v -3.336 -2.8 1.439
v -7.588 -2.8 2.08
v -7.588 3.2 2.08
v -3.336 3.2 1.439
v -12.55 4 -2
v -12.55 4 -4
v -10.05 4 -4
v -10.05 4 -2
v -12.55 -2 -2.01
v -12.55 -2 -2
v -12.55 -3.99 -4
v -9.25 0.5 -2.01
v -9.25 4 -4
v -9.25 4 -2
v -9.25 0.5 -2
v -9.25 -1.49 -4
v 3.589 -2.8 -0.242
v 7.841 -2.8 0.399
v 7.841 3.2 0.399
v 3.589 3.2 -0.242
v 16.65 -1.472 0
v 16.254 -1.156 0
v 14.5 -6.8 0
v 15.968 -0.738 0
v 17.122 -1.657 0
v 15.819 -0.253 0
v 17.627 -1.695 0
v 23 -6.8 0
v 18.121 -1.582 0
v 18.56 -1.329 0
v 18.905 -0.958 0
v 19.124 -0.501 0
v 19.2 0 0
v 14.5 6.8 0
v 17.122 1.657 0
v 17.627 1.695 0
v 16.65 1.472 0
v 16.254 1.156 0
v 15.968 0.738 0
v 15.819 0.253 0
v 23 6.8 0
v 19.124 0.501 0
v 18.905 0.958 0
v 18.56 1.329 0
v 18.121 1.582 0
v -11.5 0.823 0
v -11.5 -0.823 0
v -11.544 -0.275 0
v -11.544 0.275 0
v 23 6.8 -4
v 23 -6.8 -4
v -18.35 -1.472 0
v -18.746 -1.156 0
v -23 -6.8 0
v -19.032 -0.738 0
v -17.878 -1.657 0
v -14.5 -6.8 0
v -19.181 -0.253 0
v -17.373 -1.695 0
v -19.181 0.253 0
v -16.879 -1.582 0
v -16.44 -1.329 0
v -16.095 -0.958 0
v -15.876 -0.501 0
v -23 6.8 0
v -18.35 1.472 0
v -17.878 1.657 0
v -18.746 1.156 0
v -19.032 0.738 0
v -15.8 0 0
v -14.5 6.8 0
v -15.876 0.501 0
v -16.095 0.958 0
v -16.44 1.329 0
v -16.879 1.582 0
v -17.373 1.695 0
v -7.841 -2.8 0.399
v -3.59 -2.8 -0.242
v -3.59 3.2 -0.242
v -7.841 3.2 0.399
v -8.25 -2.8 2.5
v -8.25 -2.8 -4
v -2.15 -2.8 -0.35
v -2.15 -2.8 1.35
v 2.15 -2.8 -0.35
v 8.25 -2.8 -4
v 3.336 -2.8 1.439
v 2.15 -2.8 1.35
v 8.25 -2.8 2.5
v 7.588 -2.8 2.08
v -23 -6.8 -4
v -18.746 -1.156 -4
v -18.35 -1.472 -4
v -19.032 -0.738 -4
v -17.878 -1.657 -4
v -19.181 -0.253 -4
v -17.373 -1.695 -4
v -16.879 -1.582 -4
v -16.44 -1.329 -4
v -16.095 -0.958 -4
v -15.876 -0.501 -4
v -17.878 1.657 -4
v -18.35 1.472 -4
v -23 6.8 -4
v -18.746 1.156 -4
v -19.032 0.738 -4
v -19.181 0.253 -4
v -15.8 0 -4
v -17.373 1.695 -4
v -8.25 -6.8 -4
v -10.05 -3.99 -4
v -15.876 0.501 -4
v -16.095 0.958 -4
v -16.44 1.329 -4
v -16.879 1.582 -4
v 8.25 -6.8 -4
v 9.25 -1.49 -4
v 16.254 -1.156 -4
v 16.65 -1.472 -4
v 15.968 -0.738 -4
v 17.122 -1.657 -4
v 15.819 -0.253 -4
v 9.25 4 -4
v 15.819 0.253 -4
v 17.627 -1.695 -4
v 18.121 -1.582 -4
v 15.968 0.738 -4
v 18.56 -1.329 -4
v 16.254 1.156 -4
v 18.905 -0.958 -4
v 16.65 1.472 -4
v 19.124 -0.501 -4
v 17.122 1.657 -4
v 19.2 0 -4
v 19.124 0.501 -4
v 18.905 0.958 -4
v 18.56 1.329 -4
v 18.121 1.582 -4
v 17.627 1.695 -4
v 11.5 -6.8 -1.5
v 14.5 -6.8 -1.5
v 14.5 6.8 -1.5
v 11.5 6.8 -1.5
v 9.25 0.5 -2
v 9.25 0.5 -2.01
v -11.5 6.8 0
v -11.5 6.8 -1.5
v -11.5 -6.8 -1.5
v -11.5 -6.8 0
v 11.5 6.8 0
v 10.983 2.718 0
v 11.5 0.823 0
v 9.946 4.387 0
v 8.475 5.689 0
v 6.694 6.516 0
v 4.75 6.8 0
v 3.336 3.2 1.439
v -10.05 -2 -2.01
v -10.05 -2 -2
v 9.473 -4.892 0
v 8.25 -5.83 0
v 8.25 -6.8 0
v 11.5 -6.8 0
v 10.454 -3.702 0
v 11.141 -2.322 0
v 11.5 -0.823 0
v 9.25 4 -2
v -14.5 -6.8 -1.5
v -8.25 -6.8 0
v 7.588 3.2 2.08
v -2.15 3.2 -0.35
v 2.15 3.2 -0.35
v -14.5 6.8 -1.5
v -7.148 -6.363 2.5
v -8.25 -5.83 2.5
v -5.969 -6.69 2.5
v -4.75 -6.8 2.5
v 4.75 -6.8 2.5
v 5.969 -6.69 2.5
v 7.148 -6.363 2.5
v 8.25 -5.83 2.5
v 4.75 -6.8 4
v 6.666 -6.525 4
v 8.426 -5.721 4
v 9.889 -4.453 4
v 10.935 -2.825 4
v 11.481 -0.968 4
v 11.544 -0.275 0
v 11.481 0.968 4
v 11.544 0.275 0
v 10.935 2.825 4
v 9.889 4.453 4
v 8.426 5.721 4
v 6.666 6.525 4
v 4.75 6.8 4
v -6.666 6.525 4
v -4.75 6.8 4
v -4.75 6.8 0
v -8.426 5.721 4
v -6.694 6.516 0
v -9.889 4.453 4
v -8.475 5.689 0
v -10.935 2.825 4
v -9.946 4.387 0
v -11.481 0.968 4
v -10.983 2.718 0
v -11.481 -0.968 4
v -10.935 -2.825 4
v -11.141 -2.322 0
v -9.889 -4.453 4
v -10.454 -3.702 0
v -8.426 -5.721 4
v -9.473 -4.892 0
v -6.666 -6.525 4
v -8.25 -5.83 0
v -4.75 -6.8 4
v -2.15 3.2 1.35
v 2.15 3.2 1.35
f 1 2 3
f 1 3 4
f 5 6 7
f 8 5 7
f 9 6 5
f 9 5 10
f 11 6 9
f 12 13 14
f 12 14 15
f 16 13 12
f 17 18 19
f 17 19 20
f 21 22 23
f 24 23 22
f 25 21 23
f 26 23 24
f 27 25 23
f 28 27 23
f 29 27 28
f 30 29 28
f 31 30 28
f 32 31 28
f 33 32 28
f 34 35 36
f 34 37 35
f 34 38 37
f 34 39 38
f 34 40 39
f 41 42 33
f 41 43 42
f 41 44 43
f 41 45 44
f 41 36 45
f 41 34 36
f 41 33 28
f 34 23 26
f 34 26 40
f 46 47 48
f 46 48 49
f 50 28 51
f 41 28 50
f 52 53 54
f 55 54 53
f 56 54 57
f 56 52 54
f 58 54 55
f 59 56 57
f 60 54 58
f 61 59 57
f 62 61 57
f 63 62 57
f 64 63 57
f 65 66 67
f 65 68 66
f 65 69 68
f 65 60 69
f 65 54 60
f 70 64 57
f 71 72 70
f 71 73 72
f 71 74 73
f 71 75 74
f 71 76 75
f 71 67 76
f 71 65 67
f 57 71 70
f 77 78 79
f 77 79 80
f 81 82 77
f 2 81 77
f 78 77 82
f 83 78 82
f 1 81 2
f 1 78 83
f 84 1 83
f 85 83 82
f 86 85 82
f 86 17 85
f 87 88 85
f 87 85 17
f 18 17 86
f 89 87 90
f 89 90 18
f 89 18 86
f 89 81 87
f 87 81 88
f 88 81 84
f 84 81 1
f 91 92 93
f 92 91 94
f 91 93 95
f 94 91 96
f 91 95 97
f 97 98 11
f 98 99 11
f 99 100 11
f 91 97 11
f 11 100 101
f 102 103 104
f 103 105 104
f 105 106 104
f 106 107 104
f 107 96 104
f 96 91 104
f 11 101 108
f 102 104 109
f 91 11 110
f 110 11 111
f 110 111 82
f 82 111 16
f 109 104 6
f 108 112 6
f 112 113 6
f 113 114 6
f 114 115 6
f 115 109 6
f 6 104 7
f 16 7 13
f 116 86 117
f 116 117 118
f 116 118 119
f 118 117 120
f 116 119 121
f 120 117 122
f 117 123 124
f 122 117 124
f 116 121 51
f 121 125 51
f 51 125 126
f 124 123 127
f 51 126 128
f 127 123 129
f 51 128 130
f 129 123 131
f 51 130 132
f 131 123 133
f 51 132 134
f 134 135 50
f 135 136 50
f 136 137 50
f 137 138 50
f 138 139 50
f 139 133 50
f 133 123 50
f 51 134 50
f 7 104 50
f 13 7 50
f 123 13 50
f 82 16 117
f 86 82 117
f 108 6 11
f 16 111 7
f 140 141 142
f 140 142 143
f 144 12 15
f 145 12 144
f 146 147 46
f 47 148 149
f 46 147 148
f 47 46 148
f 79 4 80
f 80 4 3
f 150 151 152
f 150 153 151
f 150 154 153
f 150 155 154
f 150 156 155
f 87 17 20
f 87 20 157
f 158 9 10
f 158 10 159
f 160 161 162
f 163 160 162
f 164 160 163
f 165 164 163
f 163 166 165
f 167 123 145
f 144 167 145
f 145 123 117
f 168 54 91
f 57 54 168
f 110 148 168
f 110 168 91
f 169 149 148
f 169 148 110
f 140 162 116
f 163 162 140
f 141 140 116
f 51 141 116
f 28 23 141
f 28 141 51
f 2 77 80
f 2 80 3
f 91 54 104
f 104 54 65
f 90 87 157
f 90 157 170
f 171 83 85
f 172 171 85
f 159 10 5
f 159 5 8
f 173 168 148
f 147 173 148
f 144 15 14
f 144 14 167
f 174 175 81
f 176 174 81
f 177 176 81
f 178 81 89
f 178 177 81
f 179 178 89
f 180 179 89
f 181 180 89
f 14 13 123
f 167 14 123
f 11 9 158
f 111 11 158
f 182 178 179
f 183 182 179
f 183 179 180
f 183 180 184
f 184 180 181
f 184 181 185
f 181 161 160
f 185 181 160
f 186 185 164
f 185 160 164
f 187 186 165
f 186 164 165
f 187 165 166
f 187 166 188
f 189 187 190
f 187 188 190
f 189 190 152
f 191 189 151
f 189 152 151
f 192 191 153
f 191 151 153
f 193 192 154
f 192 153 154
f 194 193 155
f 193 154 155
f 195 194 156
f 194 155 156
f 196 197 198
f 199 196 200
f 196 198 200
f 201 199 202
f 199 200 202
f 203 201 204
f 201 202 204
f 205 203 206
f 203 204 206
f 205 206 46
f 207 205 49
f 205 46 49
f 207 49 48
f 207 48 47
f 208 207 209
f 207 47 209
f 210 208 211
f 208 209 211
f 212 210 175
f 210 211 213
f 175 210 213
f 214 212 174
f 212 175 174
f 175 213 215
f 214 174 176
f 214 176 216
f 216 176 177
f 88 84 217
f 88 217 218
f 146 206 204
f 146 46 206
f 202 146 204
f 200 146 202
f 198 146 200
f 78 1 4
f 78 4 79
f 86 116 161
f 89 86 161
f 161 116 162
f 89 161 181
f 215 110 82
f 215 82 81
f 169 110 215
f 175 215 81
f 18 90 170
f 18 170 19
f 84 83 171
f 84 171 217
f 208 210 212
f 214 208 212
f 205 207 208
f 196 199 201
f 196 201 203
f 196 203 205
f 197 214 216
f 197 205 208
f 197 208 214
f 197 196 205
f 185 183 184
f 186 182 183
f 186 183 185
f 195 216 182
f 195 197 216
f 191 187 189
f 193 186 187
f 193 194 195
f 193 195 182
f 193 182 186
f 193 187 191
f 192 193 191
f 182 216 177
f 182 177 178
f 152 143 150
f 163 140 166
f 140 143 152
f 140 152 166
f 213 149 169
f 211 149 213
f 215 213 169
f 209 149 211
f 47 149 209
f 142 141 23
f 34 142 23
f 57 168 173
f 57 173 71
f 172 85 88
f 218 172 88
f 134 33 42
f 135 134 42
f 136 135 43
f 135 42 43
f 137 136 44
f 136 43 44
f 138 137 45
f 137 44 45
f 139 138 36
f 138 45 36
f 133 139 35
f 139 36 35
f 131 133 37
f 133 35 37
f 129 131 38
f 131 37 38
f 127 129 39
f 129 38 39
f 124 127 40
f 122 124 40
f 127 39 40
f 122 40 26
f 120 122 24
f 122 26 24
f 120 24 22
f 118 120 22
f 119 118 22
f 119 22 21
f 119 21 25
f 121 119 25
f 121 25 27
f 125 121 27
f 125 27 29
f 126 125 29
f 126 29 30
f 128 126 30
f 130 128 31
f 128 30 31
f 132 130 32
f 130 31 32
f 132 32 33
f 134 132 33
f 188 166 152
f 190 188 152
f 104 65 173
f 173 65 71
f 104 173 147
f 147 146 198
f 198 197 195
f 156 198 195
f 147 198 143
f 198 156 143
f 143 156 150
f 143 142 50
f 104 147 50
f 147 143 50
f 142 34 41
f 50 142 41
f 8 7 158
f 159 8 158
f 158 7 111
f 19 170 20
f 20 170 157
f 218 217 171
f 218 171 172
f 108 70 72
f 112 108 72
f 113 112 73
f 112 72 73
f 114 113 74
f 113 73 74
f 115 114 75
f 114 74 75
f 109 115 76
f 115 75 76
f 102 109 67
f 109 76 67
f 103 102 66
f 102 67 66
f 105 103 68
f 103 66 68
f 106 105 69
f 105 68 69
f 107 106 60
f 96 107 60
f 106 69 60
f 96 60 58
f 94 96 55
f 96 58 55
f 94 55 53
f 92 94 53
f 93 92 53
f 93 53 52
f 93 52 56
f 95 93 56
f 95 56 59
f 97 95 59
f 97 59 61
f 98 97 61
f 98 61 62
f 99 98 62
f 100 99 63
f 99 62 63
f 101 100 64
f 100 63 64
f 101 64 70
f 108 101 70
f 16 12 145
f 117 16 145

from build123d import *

# Parameters (mm, degrees)
SKETCH_W        = 46
SKETCH_H        = 13.6
SKETCH_R        = 1.7
PAD_DEPTH       = 4
PAD001_DEPTH    = 4
SKETCH002_W     = 4.3
SKETCH002_H     = 1.7
POCKET_DEPTH    = 10
SKETCH003_W     = 16.5
SKETCH003_H     = 7.2
POCKET001_DEPTH = 4
SKETCH004_W     = 3
SKETCH004_H     = 1.5
POCKET002_DEPTH = 110.862709
SKETCH005_W     = 18.5
SKETCH005_H     = 3.5
SKETCH005_W_2   = 2.5
SKETCH005_H_2   = 6
POCKET003_DEPTH = 2
CHAMFER_SIZE    = 1.99
CHAMFER001_SIZE = 1.99


with BuildPart() as part:
    # Sketch → Pad (new body)
    with BuildSketch(Plane.XY):
        Rectangle(SKETCH_W, SKETCH_H)
        with Locations((-17.5, 0)):
            Circle(SKETCH_R, mode=Mode.SUBTRACT)
        with Locations((17.5, 0)):
            Circle(SKETCH_R, mode=Mode.SUBTRACT)
    extrude(amount=-PAD_DEPTH)

    # Sketch001 → Pad001 (new body)
    with BuildSketch(Plane.XY):
        with BuildLine():
            ThreePointArc((-4.75, 6.8), (-11.55, 0), (-4.75, -6.8))
            Line((-4.75, -6.8), (4.75, -6.8))
            ThreePointArc((4.75, -6.8), (11.55, 0), (4.75, 6.8))
            Line((-4.75, 6.8), (4.75, 6.8))
        make_face()
    extrude(amount=PAD001_DEPTH)

    # Sketch002 → Pocket (cut)
    with BuildSketch(Plane.XZ.offset(6.8)):
        Polygon((-7.588114, 2.079739), (-3.336138, 1.438879), (-3.589501, -0.242134), (-7.841477, 0.398725), align=None)
        with Locations((0, 0.5)):
            Rectangle(SKETCH002_W, SKETCH002_H)
        Polygon((3.336139, 1.438884), (7.588117, 2.079734), (7.841476, 0.39872), (3.589499, -0.24213), align=None)
    extrude(amount=-POCKET_DEPTH, mode=Mode.SUBTRACT)

    # Sketch003 → Pocket001 (cut)
    with BuildSketch(Plane.XZ.offset(6.8)):
        with Locations((0, -1.1)):
            Rectangle(SKETCH003_W, SKETCH003_H)
    extrude(amount=-POCKET001_DEPTH, mode=Mode.SUBTRACT)

    # Sketch004 → Pocket002 (cut, through all)
    with BuildSketch(Plane.XZ.offset(6.8)):
        with Locations((-13, -0.75)):
            Rectangle(SKETCH004_W, SKETCH004_H)
    pocket002 = extrude(amount=-POCKET002_DEPTH, mode=Mode.SUBTRACT)

    # Mirrored: Pocket002 across Sketch004 V_Axis
    add(pocket002.mirror(Plane(origin=(0, -6.8, 0), x_dir=(0, -1, 0), z_dir=(1, 0, 0))), mode=Mode.SUBTRACT)

    # Sketch005 → Pocket003 (cut)
    with BuildSketch(Plane(origin=(0, 0, -4), x_dir=(1, 0, 0), z_dir=(0, 0, -1))):
        with Locations((0, -2.25)):
            Rectangle(SKETCH005_W, SKETCH005_H)
        with Locations((-11.3, -1)):
            Rectangle(SKETCH005_W_2, SKETCH005_H_2)
    extrude(amount=-POCKET003_DEPTH, mode=Mode.SUBTRACT)

    # Chamfer
    chamfer_edges = [part.edges().sort_by_distance(p)[0] for p in [
        (-11.3, -2, -4),
    ]]
    chamfer(chamfer_edges, length=CHAMFER_SIZE)

    # Chamfer001
    chamfer001_edges = [part.edges().sort_by_distance(p)[0] for p in [
        (0, 0.5, -4),
    ]]
    chamfer(chamfer001_edges, length=CHAMFER001_SIZE)


solid = part.part
